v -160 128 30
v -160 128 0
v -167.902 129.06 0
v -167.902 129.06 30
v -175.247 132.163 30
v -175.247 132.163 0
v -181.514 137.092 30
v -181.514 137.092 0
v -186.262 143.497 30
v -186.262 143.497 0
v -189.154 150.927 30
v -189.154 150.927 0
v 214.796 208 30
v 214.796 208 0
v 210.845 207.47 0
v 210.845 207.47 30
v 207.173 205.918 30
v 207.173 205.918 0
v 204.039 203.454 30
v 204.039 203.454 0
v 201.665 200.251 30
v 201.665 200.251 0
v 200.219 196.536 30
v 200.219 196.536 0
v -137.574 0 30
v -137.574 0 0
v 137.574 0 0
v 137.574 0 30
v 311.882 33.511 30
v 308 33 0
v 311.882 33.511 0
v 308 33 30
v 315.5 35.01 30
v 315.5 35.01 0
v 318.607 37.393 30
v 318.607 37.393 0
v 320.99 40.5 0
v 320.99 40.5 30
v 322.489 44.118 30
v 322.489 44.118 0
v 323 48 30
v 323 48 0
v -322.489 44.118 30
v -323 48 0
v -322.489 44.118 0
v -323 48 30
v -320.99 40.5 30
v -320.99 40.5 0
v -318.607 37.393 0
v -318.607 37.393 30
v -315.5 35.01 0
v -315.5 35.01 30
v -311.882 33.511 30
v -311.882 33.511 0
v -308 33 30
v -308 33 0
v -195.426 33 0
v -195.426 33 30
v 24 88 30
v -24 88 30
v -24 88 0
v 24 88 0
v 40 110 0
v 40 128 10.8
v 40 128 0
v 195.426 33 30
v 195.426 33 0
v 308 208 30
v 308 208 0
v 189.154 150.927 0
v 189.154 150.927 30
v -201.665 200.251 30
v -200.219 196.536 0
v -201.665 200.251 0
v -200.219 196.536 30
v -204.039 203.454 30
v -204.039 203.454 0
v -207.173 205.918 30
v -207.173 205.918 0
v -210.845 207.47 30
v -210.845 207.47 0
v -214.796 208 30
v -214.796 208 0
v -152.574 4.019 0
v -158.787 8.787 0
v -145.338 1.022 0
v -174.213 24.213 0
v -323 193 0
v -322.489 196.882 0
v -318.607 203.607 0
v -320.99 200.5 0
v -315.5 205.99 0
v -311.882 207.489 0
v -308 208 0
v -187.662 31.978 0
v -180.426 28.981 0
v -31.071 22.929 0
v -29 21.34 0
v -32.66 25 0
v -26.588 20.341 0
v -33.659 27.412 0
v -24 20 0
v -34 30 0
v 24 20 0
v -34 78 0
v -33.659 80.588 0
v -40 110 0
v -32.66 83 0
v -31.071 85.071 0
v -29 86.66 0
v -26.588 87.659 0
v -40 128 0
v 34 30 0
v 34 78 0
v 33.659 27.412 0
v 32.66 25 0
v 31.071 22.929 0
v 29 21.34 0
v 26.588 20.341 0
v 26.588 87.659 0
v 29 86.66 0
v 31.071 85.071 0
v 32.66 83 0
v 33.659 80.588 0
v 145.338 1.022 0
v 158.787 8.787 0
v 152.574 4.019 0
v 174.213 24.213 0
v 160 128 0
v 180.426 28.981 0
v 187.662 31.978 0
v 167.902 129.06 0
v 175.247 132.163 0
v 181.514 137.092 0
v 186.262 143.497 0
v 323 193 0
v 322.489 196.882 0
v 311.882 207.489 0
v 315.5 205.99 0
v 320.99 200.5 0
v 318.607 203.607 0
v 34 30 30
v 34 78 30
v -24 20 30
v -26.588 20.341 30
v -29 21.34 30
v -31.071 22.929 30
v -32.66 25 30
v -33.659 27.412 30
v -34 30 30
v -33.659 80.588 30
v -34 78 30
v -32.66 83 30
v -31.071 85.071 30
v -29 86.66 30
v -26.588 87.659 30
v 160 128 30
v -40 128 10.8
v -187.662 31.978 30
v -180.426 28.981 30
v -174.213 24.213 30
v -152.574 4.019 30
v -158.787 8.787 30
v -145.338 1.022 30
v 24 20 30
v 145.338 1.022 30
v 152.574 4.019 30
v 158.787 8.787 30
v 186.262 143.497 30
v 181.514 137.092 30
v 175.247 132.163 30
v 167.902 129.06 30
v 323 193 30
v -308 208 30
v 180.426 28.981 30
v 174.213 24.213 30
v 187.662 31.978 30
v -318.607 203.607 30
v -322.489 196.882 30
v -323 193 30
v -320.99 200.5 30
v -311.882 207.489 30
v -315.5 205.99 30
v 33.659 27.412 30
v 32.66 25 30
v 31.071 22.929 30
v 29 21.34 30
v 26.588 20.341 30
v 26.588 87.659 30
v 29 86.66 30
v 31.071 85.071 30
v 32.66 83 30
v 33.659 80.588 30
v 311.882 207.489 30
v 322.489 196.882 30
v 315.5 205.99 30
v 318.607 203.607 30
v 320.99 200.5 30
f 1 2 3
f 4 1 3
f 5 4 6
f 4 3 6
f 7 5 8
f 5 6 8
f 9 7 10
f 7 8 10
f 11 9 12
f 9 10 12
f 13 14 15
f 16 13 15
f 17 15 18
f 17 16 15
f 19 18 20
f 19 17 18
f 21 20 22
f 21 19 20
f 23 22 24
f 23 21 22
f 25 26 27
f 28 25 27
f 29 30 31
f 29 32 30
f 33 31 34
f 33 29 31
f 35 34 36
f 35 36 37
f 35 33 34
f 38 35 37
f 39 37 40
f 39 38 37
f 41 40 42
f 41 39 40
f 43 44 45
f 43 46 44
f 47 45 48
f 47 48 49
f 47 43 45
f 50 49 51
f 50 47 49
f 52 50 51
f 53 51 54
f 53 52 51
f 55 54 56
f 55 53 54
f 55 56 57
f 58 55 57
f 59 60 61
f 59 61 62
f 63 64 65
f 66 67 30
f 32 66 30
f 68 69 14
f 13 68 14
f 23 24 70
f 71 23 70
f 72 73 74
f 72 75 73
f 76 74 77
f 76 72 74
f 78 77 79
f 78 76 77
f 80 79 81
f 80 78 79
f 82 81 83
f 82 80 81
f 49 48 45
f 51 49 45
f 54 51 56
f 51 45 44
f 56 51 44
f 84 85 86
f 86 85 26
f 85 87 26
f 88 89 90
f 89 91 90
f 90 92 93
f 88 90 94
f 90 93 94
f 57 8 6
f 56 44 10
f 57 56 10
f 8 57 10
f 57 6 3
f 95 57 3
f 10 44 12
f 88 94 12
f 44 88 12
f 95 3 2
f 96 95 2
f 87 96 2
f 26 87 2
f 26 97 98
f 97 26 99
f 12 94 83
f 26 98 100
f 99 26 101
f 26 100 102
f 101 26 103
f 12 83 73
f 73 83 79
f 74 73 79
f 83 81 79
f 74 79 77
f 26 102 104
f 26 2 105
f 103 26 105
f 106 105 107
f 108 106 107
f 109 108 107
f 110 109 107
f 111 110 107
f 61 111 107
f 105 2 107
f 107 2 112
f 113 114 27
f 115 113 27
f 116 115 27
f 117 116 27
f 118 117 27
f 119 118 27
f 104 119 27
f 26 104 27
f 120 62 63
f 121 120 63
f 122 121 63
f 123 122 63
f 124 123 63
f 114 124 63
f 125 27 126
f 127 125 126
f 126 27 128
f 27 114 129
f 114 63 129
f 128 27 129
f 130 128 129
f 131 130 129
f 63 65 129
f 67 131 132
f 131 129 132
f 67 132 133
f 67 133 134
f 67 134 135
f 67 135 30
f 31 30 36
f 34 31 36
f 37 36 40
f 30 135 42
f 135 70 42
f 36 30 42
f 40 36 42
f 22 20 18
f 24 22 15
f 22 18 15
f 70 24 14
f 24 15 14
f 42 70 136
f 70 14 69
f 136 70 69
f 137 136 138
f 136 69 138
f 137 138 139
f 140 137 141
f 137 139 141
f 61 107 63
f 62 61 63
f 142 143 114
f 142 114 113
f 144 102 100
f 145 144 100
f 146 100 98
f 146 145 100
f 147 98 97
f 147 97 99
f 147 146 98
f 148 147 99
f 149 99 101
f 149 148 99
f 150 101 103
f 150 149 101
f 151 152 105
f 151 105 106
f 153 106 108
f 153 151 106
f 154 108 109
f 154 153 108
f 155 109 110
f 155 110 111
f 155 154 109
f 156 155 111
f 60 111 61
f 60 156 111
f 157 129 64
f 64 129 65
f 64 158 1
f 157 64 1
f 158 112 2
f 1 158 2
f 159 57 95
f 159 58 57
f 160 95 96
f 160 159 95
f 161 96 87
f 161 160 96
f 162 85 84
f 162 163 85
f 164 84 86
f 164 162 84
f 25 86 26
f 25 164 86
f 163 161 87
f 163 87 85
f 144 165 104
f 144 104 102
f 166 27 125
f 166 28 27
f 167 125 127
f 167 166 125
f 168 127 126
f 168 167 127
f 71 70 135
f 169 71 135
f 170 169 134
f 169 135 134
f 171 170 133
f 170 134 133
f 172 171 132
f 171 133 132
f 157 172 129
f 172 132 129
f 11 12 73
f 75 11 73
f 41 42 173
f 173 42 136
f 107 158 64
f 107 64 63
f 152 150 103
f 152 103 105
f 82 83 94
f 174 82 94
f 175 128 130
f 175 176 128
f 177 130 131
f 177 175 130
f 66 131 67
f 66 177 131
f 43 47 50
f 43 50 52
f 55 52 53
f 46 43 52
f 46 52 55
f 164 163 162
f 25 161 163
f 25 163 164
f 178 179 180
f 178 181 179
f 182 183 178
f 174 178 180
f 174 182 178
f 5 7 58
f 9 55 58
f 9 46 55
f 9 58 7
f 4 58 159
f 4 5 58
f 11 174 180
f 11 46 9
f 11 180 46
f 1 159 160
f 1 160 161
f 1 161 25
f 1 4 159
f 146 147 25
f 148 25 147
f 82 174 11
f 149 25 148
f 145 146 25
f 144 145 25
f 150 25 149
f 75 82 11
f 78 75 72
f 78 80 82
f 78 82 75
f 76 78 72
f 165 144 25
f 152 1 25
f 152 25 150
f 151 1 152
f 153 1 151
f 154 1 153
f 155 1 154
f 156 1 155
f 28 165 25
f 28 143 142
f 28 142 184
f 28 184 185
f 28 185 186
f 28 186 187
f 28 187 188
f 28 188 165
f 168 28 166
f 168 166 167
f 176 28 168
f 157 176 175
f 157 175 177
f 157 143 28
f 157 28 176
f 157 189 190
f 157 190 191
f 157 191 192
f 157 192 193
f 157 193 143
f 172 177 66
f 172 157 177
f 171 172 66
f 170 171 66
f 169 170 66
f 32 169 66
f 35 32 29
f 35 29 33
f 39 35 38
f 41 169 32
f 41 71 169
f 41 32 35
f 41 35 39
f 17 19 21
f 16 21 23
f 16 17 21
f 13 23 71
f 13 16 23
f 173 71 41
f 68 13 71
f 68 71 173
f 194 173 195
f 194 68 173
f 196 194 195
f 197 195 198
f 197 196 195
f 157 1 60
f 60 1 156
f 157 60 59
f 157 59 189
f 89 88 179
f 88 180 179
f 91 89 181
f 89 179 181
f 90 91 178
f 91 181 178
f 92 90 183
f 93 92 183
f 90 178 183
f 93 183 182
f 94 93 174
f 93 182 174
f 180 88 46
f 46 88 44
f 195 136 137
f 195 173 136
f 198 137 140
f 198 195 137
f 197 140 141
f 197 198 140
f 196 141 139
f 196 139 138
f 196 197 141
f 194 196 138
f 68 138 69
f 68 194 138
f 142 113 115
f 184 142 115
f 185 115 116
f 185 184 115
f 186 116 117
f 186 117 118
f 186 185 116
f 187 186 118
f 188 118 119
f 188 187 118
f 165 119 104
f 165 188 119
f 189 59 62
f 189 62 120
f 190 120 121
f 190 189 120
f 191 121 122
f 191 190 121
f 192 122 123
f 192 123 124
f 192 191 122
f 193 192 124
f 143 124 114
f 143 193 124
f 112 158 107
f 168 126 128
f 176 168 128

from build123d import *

# Parameters (mm, degrees)
EXTRUDE_1_DEPTH     = 30
FILLET_1_R          = 15
FILLET_2_R          = 30
CUT_EXTRUDE_1_DEPTH = 30
CUT_EXTRUDE_2_DEPTH = 40


with BuildPart() as part:
    # 草图1 → 凸台-拉伸1 (new body)
    with BuildSketch(Plane.XY):
        with BuildLine():
            Line((-323, 208), (-323, 33))
            Line((-323, 33), (-183, 33))
            Line((-183, 33), (-150, 0))
            Line((-150, 0), (150, 0))
            Line((150, 0), (183, 33))
            Line((183, 33), (323, 33))
            Line((323, 33), (323, 208))
            Line((323, 208), (203, 208))
            Line((203, 208), (189.154352992, 150.927256427))
            ThreePointArc((189.154352992, 150.927256427), (178.544779492, 134.418414947), (160, 128))
            Line((160, 128), (-160, 128))
            ThreePointArc((-160, 128), (-178.544779492, 134.418414947), (-189.154352992, 150.927256427))
            Line((-189.154352992, 150.927256427), (-203, 208))
            Line((-203, 208), (-323, 208))
        make_face()
    extrude(amount=EXTRUDE_1_DEPTH)

    # 圆角1
    fillet_1_edges = [part.edges().sort_by_distance(p)[0] for p in [
        (-203, 208, 15),
        (203, 208, 15),
        (323, 208, 15),
        (323, 33, 15),
        (-323, 33, 15),
        (-323, 208, 15),
    ]]
    fillet(fillet_1_edges, radius=FILLET_1_R)

    # 圆角2
    fillet_2_edges = [part.edges().sort_by_distance(p)[0] for p in [
        (183, 33, 15),
        (150, 0, 15),
        (-150, 0, 15),
        (-183, 33, 15),
    ]]
    fillet(fillet_2_edges, radius=FILLET_2_R)

    # 草图2 → 切除-拉伸1 (cut)
    with BuildSketch(Plane.XY.offset(30)):
        with BuildLine():
            Line((-24, 88), (24, 88))
            ThreePointArc((24, 88), (31.071067812, 85.071067812), (34, 78))
            Line((34, 78), (34, 30))
            ThreePointArc((34, 30), (31.071067812, 22.928932188), (24, 20))
            Line((24, 20), (-24, 20))
            ThreePointArc((-24, 20), (-31.071067812, 22.928932188), (-34, 30))
            Line((-34, 30), (-34, 78))
            ThreePointArc((-34, 78), (-31.071067812, 85.071067812), (-24, 88))
        make_face()
    extrude(amount=-CUT_EXTRUDE_1_DEPTH, mode=Mode.SUBTRACT)

    # 草图3 → 切除-拉伸2 (cut, symmetric)
    with BuildSketch(Plane(origin=(0, 0, 0), x_dir=(0, 0, -1), z_dir=(1, 0, 0))):
        Polygon((0, 130), (-12, 130), (0, 110), align=None)
    extrude(amount=CUT_EXTRUDE_2_DEPTH, both=True, mode=Mode.SUBTRACT)


solid = part.part
